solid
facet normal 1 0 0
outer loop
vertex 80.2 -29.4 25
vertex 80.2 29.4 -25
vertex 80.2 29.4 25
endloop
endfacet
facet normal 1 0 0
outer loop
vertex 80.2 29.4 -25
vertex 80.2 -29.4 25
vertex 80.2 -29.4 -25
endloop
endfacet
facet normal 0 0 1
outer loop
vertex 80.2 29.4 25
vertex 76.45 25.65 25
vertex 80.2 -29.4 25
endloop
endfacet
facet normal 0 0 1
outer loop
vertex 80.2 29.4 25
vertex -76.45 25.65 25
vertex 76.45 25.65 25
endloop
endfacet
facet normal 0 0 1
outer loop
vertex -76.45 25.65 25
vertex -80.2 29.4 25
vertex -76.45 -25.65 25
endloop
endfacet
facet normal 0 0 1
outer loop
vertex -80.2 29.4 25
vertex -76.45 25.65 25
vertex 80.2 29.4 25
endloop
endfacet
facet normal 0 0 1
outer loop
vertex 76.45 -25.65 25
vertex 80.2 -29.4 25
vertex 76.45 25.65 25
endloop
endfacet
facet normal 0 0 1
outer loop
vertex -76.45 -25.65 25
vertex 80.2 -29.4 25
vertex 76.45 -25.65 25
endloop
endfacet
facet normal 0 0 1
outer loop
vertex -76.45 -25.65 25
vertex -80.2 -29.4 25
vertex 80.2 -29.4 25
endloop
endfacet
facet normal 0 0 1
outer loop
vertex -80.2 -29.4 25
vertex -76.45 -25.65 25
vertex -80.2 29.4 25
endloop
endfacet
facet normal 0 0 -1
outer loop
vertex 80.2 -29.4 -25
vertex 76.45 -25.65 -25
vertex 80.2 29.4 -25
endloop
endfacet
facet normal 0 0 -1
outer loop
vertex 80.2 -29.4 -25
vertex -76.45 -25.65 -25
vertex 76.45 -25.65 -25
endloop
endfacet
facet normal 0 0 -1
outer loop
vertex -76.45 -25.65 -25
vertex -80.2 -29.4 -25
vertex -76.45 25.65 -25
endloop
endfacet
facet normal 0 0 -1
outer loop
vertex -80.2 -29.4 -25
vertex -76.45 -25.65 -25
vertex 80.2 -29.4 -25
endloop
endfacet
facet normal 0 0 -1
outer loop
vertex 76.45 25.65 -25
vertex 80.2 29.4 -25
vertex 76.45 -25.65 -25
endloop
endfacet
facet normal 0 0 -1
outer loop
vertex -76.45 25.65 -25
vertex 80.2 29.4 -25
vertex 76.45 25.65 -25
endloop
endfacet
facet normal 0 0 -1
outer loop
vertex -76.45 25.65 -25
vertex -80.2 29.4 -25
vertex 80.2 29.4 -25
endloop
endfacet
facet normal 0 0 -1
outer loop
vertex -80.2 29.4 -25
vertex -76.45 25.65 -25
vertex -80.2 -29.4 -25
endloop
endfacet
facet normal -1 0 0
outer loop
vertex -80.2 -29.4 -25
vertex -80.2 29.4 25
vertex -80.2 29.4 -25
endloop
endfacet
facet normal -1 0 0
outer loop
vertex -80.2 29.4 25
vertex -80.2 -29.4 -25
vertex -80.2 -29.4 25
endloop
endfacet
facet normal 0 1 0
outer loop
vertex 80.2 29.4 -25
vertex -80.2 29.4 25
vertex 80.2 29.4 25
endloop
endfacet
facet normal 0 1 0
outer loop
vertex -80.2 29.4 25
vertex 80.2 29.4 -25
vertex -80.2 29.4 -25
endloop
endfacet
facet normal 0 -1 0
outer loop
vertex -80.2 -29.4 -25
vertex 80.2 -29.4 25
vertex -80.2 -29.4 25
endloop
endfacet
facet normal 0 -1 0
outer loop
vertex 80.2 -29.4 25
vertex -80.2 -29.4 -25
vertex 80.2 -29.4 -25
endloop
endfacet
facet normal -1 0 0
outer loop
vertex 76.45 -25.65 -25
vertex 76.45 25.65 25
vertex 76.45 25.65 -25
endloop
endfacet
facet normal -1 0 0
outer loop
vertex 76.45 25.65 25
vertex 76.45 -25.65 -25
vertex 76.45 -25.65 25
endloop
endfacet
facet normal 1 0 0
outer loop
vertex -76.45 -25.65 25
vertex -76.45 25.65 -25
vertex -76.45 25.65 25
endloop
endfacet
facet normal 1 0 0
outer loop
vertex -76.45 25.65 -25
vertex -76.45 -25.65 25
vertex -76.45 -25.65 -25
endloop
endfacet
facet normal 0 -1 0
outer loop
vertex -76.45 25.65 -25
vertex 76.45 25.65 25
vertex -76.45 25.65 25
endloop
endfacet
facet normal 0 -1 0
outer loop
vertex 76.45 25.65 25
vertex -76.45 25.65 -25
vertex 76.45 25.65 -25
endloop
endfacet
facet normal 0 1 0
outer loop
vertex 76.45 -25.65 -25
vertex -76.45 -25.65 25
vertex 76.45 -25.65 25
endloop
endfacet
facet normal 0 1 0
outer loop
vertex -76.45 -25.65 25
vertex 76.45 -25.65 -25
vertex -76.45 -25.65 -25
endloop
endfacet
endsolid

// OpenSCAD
include <../lifetrac_v25_params.scad>

module tube_drill_jig() {
    // Fits over 2x6 tube
    tube_w = TUBE_2X6_1_4[0];
    tube_h = TUBE_2X6_1_4[1];
    wall = JIG_WALL_THICKNESS;
    
    bolt_spacing_x = 100;
    bolt_spacing_y = 80;
    
    difference() {
        // Outer shell
        cube([tube_h + 2*wall, tube_w + 2*wall, 50], center=true);
        
        // Inner cutout for tube
        cube([tube_h + JIG_CLEARANCE, tube_w + JIG_CLEARANCE, 50+2], center=true);
        
        // Drill holes
        for (x = [-bolt_spacing_y/2, bolt_spacing_y/2]) // Note: x/y swapped relative to tube orientation in arm file
        for (y = [-bolt_spacing_x/2, bolt_spacing_x/2]) // This depends on how jig is oriented
            translate([x, 0, 0]) cylinder(d=5, h=tube_w + 2*wall + 2, center=true, $fn=16); // Pilot holes
    }
}

tube_drill_jig();
